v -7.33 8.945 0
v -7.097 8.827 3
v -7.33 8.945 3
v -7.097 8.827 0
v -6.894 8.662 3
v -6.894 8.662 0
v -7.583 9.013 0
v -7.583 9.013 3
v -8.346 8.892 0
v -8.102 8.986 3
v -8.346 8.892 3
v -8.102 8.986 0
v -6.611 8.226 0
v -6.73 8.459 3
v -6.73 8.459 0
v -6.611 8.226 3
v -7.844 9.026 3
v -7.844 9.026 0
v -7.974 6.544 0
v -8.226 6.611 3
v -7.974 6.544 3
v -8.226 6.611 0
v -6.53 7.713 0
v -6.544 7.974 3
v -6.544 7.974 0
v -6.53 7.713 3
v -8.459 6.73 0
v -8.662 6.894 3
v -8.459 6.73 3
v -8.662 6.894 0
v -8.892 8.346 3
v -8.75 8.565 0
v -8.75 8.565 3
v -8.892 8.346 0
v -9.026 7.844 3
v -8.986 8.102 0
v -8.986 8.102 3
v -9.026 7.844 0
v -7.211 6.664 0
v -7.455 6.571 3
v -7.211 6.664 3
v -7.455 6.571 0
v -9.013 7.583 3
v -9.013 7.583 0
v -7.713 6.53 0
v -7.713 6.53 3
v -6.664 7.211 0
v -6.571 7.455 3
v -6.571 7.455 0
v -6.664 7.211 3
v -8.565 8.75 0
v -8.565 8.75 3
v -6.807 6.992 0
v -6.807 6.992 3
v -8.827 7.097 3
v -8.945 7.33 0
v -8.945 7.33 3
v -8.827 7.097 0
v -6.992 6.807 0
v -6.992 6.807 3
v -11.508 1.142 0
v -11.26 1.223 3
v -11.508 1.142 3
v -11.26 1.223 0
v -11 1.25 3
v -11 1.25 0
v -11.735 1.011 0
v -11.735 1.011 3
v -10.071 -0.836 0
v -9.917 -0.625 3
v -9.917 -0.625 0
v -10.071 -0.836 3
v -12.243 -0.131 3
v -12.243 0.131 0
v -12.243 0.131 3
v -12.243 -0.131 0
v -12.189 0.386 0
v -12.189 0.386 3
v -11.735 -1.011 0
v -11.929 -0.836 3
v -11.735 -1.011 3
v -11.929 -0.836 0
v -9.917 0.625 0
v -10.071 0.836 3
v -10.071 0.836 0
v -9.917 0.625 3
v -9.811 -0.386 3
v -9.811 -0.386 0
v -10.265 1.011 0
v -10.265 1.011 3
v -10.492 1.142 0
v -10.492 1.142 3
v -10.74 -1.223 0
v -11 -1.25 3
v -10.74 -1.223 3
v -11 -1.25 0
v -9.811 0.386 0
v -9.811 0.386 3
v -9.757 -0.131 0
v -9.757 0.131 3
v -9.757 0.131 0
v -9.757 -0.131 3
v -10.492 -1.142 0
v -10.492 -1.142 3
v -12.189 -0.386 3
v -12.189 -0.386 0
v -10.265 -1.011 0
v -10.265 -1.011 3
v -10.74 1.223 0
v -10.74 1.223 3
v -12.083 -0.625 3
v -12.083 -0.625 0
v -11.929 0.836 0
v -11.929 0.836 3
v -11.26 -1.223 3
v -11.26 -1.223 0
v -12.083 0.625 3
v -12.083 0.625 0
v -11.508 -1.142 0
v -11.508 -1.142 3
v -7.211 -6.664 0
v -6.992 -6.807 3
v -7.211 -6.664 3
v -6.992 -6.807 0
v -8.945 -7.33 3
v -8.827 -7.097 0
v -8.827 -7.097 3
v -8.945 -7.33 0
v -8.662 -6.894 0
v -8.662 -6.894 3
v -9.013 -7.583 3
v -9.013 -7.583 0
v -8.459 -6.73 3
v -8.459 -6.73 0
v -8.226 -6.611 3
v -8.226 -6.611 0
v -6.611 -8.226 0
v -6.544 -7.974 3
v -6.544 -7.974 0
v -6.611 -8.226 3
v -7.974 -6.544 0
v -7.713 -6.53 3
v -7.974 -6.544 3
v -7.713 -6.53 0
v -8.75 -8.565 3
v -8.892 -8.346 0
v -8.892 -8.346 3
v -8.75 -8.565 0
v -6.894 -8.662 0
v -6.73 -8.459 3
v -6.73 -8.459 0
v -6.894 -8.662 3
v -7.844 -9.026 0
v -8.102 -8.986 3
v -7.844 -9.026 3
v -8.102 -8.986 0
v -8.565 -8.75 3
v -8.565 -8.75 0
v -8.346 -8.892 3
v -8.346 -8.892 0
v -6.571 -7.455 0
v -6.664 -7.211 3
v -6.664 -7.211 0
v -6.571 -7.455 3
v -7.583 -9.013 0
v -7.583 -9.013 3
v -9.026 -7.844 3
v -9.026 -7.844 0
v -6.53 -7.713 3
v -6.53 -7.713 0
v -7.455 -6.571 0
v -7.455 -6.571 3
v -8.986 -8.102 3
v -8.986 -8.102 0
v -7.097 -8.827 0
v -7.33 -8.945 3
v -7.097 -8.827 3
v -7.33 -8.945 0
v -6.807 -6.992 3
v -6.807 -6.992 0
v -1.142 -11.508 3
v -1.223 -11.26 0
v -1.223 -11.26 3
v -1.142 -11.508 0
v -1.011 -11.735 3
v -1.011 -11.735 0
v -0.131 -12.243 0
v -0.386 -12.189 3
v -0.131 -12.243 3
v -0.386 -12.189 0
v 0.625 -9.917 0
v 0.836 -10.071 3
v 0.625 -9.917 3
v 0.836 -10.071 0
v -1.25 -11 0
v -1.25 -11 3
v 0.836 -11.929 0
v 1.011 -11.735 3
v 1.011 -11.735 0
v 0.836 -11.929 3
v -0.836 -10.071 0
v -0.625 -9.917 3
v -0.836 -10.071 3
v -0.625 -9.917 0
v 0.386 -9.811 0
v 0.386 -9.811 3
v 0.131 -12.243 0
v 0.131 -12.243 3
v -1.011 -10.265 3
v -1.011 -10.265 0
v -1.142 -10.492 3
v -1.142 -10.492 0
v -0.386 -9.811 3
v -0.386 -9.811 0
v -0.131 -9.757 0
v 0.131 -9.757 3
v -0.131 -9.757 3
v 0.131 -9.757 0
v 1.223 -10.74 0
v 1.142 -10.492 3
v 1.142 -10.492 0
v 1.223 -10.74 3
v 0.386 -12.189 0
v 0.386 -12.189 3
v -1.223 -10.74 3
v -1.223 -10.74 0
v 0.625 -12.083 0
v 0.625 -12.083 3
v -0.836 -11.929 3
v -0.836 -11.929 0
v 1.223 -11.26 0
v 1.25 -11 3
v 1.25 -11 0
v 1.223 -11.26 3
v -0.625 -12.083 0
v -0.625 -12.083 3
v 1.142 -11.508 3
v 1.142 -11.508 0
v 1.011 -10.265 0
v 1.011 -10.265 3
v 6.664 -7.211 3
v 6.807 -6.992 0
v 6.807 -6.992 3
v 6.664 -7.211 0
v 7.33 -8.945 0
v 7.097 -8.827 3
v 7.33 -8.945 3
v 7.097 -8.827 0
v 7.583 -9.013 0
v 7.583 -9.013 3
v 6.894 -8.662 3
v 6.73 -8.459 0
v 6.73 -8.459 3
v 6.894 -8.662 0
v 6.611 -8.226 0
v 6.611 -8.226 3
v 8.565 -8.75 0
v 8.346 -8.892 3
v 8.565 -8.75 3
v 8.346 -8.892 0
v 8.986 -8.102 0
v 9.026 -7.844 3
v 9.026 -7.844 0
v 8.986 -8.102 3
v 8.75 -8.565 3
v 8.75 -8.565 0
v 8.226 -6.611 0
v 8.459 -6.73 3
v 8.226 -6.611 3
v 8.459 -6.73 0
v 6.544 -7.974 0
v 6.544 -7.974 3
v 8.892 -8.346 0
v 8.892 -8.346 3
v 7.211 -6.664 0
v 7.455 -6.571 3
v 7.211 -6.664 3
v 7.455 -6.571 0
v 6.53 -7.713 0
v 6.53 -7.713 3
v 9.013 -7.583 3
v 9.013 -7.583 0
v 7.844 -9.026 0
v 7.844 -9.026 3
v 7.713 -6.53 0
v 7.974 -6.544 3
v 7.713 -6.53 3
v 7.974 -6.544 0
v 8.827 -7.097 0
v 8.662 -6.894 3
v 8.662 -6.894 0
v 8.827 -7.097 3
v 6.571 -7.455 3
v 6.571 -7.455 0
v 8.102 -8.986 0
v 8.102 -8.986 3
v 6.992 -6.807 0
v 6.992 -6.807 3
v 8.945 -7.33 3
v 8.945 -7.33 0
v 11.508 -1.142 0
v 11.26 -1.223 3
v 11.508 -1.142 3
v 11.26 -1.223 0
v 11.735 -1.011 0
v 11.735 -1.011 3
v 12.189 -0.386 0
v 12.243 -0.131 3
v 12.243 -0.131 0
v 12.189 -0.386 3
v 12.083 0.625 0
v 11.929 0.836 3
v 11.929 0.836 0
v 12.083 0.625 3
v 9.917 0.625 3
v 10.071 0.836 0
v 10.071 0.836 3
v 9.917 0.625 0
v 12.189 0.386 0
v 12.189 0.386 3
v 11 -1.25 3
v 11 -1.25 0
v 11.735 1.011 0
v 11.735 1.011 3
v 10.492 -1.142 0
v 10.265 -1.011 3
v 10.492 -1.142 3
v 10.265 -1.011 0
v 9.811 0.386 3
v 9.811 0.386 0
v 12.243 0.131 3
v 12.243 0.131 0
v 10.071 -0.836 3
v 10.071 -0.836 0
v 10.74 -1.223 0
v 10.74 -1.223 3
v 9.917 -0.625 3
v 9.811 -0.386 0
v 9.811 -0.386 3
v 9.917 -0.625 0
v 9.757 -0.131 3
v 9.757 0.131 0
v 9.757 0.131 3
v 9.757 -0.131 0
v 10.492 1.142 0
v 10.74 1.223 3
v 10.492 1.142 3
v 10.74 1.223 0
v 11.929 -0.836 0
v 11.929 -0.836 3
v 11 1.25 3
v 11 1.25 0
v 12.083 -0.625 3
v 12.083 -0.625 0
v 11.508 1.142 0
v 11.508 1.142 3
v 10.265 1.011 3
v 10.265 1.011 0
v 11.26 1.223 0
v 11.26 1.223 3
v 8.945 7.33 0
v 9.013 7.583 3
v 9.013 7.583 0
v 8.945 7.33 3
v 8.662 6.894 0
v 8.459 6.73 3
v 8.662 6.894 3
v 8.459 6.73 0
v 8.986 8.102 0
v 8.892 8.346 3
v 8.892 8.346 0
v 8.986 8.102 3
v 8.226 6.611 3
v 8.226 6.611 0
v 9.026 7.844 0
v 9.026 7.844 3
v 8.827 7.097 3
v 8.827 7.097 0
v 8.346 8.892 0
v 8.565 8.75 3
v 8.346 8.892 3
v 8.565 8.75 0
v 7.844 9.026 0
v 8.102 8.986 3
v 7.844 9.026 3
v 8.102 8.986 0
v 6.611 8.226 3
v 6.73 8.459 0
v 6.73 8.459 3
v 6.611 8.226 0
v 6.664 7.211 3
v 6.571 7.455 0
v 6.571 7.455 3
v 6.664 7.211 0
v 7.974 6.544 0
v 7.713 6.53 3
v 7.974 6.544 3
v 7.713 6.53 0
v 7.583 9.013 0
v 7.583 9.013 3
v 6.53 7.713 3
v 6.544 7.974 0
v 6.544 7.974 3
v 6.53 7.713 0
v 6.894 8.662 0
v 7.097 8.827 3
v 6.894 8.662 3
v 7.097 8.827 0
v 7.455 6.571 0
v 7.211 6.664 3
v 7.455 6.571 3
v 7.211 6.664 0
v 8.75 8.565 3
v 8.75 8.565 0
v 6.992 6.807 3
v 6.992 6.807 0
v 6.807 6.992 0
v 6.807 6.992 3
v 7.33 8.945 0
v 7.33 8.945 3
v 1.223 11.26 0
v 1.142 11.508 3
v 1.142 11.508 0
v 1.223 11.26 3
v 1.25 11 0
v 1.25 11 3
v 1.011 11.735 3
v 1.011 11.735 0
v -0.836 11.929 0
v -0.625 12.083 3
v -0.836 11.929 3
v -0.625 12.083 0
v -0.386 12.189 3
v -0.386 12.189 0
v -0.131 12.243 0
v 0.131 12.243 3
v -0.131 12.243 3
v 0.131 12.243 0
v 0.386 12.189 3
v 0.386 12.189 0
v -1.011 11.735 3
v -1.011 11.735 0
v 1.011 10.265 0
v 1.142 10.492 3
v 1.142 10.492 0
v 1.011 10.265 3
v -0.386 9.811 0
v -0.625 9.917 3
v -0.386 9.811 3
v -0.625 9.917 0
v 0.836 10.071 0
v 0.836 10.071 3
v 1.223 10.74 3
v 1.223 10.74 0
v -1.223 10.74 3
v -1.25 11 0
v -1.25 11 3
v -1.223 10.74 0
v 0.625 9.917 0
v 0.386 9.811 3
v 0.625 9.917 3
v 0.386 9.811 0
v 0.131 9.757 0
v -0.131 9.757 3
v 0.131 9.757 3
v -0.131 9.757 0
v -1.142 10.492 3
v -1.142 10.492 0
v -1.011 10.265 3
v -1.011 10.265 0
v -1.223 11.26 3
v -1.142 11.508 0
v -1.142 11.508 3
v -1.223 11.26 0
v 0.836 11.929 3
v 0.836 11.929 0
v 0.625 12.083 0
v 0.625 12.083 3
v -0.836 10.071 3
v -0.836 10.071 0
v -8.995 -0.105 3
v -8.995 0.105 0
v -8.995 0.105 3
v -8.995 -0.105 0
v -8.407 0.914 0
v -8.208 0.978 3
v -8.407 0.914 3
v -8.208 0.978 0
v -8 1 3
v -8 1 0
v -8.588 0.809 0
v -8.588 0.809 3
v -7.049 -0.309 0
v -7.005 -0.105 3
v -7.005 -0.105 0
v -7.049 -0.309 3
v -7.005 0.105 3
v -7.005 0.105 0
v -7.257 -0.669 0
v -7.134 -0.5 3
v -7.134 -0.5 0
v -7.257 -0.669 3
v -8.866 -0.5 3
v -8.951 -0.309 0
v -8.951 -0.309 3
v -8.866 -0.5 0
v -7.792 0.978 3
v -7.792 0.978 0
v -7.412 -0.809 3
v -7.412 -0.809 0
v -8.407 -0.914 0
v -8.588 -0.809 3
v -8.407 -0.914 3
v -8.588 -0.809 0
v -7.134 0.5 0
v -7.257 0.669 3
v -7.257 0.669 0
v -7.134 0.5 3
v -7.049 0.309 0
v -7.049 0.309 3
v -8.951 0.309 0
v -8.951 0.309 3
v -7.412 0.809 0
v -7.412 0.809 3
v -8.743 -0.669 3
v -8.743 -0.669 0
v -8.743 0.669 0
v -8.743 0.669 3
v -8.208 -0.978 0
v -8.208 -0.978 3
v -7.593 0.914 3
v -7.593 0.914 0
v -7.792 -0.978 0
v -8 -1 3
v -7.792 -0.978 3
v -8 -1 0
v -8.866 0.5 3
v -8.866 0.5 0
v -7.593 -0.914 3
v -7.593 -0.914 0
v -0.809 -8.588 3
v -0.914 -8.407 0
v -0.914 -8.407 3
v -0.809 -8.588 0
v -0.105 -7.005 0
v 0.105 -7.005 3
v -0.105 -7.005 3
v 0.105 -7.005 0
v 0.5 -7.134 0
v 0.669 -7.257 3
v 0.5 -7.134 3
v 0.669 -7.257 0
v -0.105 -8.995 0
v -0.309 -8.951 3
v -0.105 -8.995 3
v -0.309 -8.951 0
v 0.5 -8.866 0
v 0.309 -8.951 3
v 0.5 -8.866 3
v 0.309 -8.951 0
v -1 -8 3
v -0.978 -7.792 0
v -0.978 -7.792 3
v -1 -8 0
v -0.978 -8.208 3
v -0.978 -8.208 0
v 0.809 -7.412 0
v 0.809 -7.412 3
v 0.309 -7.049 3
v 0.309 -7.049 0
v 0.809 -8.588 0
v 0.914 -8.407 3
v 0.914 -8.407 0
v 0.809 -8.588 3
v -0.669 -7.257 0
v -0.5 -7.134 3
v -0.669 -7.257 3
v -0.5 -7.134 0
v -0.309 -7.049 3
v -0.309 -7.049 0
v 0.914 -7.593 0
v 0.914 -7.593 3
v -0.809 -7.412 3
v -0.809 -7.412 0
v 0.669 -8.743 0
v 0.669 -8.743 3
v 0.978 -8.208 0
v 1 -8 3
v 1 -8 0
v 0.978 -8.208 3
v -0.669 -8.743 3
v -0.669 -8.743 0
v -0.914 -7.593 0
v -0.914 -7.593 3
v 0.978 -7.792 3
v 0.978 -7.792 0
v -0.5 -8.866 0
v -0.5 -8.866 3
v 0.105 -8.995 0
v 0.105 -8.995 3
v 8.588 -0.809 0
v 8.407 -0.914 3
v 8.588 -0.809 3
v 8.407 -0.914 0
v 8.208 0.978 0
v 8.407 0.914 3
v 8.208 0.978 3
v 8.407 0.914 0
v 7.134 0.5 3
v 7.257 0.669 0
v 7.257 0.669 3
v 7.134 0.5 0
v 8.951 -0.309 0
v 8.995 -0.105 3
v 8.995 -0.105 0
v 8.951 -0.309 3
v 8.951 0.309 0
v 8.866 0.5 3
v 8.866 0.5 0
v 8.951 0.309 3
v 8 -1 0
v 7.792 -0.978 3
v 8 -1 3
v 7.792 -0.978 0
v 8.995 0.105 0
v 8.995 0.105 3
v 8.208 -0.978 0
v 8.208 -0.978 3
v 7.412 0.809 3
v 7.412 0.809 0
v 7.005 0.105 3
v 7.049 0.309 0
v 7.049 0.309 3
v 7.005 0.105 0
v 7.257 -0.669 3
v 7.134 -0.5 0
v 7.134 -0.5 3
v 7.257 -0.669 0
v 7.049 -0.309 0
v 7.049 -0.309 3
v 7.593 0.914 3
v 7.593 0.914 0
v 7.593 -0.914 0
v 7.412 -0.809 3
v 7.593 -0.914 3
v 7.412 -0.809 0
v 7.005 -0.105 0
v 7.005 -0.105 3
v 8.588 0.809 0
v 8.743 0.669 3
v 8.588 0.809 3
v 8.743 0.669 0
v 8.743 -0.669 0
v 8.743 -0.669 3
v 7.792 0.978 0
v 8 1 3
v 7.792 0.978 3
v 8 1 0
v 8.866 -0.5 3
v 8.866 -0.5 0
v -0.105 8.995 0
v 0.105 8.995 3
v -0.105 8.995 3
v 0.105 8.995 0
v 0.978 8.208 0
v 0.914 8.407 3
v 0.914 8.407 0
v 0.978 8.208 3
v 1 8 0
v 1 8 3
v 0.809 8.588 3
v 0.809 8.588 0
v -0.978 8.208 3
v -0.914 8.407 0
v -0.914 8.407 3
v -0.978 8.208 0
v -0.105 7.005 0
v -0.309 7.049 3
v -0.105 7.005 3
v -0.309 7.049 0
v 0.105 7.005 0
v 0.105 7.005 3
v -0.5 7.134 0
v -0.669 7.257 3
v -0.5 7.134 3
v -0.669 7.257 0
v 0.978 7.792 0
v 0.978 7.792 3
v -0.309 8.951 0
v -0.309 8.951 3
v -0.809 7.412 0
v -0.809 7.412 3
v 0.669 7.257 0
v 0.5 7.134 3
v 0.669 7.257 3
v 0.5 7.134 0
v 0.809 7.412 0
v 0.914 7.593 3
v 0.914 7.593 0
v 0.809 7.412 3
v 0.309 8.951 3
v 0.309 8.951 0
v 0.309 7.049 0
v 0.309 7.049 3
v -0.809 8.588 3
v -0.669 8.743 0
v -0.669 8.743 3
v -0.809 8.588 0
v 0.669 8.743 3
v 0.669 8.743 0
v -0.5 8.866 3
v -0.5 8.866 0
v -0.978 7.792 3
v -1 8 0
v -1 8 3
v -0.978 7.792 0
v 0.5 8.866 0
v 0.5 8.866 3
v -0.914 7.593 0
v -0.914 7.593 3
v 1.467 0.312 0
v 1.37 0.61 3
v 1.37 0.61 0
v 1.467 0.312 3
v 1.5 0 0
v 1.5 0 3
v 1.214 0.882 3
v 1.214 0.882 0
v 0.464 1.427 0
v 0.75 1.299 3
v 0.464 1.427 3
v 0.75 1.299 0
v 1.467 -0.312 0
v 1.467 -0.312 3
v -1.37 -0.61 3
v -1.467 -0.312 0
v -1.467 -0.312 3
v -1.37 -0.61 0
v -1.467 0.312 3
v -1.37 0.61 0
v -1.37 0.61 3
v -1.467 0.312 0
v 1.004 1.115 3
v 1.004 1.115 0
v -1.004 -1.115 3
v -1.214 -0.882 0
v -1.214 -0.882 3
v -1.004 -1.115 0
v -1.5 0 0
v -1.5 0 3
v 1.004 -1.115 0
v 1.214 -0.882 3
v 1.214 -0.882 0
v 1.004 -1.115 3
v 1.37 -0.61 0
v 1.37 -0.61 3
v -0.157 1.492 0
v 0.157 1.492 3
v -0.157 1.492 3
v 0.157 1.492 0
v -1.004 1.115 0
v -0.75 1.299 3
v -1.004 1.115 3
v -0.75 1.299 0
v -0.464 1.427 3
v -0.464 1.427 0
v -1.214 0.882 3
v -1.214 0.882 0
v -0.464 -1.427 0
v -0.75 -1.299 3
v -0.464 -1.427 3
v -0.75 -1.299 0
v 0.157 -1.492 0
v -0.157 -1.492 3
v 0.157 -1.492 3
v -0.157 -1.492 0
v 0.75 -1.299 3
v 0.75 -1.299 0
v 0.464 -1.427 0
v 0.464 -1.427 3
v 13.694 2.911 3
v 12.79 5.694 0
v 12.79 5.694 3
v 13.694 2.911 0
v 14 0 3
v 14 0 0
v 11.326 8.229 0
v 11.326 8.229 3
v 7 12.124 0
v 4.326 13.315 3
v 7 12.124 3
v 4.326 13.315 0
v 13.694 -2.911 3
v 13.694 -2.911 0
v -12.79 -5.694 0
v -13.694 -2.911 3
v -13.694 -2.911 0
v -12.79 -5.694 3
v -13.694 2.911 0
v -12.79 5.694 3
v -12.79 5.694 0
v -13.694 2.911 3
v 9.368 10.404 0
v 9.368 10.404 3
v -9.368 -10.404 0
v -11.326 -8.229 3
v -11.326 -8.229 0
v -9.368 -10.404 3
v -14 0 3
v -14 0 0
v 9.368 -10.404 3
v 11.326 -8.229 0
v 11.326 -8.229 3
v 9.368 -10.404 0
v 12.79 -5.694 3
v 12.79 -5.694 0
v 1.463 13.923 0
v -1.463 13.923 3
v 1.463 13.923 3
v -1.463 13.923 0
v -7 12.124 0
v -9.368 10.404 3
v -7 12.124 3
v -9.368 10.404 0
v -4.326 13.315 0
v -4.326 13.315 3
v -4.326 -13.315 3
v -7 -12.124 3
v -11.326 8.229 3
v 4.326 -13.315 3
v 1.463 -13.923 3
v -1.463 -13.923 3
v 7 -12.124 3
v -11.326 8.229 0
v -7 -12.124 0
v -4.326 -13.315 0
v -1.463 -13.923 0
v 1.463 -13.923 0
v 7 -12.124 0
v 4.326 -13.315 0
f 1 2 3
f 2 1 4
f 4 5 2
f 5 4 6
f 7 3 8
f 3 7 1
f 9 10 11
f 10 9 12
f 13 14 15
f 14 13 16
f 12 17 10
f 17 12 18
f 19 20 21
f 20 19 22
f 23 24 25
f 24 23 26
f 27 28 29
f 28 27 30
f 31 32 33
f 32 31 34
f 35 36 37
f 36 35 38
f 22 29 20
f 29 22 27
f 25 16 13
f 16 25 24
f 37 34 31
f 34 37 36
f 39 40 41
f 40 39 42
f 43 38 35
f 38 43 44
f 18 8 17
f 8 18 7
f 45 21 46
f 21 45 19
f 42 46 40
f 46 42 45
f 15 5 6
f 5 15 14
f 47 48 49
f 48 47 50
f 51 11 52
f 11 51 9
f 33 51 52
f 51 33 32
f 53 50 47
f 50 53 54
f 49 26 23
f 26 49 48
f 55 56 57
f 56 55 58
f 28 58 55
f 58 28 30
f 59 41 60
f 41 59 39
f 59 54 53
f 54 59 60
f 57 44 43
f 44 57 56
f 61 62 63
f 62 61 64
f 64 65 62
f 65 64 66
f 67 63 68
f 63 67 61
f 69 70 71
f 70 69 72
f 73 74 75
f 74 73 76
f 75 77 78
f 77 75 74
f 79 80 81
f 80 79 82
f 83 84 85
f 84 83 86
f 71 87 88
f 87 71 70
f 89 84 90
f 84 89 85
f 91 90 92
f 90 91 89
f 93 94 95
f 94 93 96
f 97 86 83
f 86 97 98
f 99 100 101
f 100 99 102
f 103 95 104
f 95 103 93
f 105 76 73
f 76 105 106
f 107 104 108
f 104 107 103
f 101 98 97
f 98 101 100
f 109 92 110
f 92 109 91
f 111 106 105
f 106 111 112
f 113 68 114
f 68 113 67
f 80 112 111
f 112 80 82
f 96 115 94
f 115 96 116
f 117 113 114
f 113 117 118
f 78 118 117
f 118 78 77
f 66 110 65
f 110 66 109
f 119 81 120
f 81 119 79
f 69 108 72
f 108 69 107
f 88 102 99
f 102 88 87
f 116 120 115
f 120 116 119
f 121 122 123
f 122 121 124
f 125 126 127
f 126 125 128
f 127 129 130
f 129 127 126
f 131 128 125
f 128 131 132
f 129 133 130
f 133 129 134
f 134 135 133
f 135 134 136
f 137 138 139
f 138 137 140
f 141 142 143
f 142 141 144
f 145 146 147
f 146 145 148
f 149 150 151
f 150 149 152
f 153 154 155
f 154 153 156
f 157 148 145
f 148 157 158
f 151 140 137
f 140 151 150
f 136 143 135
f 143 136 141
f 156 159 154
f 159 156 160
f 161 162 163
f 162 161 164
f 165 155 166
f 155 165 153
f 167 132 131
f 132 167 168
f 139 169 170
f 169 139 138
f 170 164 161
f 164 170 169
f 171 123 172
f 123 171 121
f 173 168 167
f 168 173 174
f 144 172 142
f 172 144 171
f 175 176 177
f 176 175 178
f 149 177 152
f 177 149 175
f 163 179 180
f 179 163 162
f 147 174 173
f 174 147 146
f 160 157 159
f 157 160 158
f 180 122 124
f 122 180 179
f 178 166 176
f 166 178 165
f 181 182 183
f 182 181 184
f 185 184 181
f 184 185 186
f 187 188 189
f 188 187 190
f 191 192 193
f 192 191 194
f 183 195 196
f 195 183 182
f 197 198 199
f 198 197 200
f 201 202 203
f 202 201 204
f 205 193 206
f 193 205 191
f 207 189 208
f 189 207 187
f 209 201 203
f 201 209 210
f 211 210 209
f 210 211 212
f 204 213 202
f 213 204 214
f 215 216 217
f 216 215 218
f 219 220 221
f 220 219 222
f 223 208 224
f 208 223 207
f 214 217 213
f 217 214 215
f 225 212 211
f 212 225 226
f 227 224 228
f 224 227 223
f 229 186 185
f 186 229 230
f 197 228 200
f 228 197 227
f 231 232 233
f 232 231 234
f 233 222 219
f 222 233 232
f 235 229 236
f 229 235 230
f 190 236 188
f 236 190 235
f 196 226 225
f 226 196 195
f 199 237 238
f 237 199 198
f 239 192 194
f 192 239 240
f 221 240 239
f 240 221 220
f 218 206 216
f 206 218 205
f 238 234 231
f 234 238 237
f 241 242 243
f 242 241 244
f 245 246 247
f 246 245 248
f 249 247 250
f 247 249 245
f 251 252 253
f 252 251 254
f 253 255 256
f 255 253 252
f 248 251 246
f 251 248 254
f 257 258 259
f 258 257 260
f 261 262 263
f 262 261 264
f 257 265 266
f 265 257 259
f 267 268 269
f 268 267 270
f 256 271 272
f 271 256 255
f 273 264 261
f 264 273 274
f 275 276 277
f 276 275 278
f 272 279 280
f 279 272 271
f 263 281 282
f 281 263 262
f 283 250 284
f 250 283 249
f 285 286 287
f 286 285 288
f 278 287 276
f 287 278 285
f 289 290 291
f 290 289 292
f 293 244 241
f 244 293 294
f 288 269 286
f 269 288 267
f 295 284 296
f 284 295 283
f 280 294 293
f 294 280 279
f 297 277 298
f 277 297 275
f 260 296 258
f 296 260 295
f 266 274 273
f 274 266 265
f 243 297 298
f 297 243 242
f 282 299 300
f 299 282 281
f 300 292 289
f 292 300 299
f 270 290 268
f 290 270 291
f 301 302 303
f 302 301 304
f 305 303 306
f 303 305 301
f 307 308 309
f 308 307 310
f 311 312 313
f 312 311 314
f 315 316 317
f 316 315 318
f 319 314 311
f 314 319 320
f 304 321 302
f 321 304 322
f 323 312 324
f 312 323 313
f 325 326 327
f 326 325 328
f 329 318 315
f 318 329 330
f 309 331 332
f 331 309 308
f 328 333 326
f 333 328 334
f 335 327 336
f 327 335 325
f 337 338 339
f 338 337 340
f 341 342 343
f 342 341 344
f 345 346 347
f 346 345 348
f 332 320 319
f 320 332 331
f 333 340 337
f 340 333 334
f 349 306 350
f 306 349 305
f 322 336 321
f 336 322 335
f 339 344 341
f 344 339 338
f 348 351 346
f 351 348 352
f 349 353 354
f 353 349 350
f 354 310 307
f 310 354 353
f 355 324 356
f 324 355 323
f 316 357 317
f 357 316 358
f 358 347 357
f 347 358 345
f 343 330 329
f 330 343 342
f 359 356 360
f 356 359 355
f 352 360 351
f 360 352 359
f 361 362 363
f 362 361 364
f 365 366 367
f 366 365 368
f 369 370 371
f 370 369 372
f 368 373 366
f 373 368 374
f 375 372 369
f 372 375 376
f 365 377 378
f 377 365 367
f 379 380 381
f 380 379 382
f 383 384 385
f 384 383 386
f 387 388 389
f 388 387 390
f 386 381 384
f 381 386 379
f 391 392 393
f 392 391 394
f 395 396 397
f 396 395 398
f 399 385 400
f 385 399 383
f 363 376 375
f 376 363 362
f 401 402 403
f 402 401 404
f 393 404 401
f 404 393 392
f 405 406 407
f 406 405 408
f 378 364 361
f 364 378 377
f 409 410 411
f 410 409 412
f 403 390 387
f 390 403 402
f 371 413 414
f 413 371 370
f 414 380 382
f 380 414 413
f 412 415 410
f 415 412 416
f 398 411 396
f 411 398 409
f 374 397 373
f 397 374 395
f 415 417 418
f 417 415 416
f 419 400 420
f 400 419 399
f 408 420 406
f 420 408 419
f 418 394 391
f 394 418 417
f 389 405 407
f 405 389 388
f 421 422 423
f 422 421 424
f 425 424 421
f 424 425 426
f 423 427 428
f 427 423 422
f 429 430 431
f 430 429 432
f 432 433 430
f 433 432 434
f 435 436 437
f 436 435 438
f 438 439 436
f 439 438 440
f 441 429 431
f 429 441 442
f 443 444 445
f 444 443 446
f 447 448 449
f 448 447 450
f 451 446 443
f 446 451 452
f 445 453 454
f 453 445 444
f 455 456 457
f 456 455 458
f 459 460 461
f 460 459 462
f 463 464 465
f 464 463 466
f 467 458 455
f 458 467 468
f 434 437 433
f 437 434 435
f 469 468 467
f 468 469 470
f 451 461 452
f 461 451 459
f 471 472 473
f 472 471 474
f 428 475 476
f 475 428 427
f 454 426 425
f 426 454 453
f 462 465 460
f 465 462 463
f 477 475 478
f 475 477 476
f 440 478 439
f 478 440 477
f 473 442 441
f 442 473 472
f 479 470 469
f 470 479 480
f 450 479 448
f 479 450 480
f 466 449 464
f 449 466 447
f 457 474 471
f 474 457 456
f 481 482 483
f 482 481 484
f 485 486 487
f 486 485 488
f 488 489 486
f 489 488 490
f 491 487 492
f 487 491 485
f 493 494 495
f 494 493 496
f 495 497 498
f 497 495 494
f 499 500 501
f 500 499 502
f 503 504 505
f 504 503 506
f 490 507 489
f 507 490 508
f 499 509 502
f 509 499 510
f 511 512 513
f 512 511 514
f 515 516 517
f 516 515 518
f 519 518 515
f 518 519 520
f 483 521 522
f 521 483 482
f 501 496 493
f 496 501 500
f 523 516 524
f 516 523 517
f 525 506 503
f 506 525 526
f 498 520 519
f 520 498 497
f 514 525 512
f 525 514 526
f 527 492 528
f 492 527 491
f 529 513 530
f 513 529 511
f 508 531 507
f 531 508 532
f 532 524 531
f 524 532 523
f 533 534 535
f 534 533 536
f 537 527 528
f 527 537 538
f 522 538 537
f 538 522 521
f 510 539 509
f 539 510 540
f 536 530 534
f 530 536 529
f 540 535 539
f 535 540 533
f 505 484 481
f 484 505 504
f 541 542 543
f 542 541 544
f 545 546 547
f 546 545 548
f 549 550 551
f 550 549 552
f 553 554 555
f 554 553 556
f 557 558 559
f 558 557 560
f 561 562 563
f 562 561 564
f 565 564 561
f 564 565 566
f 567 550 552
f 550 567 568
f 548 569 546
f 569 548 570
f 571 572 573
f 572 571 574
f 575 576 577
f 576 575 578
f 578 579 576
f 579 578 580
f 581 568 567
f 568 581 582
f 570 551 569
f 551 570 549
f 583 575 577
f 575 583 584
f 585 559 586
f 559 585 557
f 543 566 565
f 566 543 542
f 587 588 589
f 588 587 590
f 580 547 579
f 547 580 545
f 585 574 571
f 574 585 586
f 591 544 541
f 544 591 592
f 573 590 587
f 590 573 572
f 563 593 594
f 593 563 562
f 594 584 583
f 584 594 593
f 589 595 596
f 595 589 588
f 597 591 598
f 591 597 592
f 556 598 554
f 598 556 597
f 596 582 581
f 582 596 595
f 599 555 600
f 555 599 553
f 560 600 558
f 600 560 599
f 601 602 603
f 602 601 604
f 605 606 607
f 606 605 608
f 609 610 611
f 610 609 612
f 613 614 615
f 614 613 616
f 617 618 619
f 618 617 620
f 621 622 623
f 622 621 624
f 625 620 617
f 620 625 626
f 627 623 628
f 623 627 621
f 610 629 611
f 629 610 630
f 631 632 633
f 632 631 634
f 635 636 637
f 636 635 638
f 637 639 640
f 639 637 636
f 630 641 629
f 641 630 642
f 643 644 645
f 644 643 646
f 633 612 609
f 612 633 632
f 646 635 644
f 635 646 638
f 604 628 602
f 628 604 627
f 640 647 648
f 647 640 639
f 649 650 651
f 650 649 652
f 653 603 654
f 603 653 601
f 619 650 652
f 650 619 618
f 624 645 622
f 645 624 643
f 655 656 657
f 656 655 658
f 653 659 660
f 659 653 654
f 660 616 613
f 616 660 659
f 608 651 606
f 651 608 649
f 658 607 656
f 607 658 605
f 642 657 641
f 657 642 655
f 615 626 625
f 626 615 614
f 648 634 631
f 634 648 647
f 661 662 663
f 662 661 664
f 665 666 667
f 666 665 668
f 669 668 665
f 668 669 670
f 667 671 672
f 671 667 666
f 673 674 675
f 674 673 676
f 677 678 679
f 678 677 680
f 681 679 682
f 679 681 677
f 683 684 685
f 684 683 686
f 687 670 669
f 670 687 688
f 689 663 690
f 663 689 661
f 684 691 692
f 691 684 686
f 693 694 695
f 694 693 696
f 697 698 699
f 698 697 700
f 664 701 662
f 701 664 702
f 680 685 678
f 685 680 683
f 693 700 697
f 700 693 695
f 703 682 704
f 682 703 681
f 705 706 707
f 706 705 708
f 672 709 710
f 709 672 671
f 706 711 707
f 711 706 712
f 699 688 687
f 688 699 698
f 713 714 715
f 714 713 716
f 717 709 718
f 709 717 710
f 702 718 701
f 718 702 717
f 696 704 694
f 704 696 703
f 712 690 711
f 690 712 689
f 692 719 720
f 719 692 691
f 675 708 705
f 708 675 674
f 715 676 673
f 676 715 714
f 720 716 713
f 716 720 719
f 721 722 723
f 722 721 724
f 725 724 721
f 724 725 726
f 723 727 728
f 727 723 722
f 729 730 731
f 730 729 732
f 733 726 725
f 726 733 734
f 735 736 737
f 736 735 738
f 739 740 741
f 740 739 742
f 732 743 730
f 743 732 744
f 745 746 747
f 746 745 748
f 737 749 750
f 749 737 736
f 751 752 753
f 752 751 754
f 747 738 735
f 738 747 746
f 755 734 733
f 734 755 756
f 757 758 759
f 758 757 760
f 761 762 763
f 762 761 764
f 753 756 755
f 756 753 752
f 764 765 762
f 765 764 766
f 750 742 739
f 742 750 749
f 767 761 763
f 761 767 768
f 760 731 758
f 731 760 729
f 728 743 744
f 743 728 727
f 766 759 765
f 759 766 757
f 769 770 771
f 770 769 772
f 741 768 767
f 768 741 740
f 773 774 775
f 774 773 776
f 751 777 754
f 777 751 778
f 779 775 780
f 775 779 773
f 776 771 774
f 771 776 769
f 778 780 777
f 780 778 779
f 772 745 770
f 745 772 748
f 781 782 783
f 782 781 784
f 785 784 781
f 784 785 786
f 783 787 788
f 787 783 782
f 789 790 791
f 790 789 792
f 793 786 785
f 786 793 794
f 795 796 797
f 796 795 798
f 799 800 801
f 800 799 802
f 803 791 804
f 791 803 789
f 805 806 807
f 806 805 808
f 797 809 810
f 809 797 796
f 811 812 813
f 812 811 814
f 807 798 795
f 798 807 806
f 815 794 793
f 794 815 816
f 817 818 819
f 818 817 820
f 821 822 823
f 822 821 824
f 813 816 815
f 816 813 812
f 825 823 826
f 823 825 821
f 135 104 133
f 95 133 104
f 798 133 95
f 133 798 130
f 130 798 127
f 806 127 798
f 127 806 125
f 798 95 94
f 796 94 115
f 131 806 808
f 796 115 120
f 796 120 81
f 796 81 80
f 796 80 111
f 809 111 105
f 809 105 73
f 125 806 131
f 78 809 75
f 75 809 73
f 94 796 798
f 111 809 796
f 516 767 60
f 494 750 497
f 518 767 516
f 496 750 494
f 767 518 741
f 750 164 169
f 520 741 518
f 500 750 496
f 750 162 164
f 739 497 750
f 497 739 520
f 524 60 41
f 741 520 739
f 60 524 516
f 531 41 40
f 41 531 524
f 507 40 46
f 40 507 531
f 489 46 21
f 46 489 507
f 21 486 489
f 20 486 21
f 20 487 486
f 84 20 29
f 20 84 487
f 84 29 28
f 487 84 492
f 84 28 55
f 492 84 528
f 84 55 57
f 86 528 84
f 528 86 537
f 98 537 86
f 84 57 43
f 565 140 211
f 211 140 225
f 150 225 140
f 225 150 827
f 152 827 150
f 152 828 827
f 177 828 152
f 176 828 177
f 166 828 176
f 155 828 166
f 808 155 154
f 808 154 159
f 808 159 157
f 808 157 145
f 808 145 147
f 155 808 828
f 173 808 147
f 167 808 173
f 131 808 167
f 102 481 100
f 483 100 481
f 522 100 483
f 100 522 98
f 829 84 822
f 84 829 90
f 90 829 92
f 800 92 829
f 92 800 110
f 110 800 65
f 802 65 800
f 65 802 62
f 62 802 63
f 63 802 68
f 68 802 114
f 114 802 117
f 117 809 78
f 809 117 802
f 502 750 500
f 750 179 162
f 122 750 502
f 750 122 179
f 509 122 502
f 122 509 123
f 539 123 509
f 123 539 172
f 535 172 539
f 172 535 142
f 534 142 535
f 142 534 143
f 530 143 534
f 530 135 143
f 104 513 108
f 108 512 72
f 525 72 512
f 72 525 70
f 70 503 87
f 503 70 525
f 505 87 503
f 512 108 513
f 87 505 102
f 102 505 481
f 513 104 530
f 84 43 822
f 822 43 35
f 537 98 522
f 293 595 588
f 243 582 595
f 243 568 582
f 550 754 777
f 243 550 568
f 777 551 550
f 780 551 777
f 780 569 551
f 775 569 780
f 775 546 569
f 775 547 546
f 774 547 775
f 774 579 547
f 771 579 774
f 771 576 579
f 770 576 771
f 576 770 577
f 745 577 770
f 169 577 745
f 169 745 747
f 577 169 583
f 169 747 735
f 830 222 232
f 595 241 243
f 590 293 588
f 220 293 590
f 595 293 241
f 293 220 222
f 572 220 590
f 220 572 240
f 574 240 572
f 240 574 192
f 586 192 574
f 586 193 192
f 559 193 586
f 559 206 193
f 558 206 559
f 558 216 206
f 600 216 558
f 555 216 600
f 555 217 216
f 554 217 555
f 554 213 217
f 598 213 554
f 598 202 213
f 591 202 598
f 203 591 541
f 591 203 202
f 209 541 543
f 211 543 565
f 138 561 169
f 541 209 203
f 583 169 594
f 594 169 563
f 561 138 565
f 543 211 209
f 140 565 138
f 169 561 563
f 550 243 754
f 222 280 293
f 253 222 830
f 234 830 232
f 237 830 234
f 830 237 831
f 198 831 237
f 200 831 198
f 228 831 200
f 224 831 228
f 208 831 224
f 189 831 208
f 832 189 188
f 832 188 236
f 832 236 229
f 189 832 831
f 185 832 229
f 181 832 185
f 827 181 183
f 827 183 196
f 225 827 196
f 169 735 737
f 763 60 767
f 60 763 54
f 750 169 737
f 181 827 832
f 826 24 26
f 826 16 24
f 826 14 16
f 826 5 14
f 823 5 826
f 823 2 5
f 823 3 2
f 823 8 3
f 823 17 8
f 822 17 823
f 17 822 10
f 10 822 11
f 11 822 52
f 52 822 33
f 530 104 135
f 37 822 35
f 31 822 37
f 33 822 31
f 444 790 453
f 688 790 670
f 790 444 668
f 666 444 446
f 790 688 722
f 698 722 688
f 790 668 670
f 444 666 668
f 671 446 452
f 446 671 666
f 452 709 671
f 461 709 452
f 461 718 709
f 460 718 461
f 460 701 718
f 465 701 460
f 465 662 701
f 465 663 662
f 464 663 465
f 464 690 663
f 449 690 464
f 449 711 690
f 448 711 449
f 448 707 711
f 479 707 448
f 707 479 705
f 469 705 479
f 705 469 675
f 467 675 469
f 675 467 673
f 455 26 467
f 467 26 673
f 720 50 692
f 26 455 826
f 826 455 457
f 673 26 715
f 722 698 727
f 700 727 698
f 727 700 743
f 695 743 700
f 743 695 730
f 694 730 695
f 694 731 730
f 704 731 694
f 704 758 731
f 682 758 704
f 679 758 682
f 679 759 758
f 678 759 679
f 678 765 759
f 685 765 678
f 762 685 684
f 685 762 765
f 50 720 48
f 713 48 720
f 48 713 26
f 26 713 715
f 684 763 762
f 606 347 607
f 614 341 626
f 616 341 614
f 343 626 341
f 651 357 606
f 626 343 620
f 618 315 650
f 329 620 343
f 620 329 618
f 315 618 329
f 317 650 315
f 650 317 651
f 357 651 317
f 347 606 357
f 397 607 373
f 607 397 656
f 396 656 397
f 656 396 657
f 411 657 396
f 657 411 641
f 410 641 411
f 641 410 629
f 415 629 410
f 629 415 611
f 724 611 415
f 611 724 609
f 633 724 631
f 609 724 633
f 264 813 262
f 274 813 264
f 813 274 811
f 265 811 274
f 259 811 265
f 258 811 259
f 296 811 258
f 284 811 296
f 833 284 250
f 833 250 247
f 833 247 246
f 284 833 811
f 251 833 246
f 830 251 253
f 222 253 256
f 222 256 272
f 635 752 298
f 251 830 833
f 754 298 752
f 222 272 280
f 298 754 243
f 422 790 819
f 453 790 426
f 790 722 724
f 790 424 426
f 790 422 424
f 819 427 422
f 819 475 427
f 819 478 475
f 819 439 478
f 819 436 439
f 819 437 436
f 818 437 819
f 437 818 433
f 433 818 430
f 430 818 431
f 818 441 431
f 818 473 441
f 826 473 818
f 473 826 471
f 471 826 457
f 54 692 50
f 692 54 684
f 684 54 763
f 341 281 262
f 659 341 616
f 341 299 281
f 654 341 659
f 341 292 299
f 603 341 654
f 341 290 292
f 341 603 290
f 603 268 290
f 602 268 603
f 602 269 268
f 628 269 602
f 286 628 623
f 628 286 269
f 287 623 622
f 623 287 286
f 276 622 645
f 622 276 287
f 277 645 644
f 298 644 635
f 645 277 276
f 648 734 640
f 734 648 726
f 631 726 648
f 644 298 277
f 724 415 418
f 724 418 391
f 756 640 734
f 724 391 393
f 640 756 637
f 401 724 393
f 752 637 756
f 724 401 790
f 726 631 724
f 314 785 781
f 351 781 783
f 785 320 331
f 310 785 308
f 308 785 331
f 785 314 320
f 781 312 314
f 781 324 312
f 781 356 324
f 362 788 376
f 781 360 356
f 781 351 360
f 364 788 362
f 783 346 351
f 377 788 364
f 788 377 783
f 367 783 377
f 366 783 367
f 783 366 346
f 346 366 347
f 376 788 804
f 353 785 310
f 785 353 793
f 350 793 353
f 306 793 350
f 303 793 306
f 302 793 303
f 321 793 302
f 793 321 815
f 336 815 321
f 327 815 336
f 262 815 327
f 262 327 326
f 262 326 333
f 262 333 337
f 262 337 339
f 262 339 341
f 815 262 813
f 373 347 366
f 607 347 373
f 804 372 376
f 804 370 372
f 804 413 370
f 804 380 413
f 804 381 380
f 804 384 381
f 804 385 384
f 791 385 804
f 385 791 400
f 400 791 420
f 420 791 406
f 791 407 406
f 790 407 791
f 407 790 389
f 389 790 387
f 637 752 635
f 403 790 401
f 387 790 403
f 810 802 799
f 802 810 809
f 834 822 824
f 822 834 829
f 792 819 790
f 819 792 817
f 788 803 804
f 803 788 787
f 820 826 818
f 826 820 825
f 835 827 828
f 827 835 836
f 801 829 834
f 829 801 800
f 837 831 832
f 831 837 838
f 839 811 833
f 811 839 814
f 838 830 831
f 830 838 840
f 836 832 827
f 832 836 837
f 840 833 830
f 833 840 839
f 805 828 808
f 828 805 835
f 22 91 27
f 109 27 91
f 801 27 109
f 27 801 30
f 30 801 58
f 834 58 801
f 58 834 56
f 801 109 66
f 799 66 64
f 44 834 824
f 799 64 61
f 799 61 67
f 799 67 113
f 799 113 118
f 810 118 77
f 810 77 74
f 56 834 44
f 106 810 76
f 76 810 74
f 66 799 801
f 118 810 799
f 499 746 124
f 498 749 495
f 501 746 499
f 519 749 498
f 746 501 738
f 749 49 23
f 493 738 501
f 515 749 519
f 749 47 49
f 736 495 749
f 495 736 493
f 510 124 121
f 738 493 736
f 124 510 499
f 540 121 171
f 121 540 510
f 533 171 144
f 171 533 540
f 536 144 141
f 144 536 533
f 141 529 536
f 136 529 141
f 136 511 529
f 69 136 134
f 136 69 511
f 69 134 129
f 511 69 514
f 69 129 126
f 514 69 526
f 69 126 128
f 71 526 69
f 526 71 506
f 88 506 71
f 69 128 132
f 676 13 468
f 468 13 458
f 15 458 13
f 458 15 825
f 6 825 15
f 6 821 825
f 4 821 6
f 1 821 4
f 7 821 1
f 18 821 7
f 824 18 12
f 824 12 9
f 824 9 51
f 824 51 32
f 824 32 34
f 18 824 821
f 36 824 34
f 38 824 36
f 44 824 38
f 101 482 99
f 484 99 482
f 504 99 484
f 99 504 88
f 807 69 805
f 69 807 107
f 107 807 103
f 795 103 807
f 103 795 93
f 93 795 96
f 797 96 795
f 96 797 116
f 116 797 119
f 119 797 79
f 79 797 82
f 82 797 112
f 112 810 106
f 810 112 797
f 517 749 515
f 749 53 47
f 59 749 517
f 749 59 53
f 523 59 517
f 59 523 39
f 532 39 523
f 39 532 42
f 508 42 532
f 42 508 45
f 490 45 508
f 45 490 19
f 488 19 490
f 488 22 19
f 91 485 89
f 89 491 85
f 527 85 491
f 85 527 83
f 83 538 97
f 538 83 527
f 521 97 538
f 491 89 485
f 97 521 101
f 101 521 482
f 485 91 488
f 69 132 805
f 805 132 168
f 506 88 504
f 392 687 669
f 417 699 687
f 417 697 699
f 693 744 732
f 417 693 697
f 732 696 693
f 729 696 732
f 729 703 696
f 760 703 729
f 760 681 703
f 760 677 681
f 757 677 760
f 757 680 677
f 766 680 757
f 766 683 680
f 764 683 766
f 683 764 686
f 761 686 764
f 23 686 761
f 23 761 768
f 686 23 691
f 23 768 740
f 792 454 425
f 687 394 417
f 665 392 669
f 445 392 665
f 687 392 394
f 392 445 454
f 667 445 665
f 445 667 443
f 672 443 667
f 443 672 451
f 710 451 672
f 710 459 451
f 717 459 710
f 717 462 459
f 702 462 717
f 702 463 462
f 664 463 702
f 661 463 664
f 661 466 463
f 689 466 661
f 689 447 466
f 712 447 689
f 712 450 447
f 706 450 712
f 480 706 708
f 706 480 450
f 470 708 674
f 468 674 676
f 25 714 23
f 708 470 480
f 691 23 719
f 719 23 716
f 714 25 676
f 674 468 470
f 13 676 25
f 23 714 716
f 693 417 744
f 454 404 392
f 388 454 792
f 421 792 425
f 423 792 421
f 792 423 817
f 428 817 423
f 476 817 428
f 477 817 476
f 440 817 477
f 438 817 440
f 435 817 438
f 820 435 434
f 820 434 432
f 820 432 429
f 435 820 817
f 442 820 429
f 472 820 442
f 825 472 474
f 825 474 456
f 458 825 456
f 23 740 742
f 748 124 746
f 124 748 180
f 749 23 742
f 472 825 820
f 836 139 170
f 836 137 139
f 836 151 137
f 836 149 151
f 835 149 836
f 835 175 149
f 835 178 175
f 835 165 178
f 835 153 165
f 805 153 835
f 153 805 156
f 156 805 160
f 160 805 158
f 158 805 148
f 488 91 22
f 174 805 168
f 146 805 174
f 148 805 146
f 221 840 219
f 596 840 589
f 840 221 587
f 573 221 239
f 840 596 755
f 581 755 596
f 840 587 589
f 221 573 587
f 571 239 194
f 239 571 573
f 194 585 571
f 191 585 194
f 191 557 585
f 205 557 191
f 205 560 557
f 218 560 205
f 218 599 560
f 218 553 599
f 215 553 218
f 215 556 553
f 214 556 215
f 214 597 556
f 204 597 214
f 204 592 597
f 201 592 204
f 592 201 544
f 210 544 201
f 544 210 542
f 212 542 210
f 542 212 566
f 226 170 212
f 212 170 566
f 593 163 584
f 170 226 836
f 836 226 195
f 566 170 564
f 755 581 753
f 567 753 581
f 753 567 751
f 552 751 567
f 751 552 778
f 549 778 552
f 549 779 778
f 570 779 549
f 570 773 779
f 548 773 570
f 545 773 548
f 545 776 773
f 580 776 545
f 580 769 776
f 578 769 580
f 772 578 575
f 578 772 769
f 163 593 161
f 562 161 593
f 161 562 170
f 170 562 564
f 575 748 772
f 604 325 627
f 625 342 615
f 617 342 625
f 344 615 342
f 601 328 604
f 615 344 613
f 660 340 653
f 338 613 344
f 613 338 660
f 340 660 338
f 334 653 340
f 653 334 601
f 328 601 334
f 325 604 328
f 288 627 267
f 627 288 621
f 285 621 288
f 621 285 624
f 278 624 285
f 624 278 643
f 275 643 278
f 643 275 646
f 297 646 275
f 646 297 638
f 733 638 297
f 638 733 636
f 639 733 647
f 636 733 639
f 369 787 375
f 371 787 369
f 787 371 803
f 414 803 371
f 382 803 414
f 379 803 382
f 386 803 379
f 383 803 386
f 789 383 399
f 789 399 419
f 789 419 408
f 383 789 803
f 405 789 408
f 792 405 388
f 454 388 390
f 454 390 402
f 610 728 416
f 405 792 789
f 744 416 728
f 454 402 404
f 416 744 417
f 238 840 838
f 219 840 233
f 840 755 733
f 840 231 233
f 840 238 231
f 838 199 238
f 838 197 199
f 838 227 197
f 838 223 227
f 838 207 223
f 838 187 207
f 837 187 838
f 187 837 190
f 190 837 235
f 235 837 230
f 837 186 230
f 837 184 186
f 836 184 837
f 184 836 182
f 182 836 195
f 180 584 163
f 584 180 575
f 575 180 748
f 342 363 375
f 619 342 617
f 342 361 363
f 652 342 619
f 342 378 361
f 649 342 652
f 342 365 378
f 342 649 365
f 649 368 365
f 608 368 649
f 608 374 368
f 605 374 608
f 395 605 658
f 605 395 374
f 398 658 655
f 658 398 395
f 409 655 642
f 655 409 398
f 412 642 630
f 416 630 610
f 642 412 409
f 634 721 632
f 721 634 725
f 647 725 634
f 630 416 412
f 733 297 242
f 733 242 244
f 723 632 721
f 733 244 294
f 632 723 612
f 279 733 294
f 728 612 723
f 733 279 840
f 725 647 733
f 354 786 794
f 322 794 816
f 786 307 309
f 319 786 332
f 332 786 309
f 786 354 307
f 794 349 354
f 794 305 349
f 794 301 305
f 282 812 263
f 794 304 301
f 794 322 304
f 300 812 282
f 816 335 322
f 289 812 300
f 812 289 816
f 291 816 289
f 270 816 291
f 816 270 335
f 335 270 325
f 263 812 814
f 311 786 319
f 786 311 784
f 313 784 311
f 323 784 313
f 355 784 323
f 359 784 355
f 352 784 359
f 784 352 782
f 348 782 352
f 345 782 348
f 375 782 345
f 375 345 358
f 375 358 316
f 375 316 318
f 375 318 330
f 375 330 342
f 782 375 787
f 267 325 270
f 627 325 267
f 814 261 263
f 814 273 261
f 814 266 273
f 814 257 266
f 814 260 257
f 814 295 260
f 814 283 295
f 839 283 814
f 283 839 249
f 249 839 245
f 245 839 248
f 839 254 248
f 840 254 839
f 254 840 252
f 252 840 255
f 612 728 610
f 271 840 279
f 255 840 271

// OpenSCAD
Collisions = false;
$fn=30;

module mx64_arm_holes()
{
    for (i=[1:8]) {
                rotate([0,0,i*360/8])
                translate([0,11,0])
                    cylinder(d=2.5, h=10, center=true);
            }
            
            for (i=[1:4]) {
                rotate([0,0,i*360/4])
                translate([0,8,0])
                    cylinder(d=2, h=10, center=true);
            }
            
            cylinder(d=3, h=10, center=true);
}

//:Model "MX-64 Arm" [0.5,0.5,0.5]
module mx64_arm()
{
    if (!Collisions) {
        color([0.5,0.5,0.5])
        difference() {
            cylinder(d=28, h=3);
            
            mx64_arm_holes();
        }
    }
}

mx64_arm();
